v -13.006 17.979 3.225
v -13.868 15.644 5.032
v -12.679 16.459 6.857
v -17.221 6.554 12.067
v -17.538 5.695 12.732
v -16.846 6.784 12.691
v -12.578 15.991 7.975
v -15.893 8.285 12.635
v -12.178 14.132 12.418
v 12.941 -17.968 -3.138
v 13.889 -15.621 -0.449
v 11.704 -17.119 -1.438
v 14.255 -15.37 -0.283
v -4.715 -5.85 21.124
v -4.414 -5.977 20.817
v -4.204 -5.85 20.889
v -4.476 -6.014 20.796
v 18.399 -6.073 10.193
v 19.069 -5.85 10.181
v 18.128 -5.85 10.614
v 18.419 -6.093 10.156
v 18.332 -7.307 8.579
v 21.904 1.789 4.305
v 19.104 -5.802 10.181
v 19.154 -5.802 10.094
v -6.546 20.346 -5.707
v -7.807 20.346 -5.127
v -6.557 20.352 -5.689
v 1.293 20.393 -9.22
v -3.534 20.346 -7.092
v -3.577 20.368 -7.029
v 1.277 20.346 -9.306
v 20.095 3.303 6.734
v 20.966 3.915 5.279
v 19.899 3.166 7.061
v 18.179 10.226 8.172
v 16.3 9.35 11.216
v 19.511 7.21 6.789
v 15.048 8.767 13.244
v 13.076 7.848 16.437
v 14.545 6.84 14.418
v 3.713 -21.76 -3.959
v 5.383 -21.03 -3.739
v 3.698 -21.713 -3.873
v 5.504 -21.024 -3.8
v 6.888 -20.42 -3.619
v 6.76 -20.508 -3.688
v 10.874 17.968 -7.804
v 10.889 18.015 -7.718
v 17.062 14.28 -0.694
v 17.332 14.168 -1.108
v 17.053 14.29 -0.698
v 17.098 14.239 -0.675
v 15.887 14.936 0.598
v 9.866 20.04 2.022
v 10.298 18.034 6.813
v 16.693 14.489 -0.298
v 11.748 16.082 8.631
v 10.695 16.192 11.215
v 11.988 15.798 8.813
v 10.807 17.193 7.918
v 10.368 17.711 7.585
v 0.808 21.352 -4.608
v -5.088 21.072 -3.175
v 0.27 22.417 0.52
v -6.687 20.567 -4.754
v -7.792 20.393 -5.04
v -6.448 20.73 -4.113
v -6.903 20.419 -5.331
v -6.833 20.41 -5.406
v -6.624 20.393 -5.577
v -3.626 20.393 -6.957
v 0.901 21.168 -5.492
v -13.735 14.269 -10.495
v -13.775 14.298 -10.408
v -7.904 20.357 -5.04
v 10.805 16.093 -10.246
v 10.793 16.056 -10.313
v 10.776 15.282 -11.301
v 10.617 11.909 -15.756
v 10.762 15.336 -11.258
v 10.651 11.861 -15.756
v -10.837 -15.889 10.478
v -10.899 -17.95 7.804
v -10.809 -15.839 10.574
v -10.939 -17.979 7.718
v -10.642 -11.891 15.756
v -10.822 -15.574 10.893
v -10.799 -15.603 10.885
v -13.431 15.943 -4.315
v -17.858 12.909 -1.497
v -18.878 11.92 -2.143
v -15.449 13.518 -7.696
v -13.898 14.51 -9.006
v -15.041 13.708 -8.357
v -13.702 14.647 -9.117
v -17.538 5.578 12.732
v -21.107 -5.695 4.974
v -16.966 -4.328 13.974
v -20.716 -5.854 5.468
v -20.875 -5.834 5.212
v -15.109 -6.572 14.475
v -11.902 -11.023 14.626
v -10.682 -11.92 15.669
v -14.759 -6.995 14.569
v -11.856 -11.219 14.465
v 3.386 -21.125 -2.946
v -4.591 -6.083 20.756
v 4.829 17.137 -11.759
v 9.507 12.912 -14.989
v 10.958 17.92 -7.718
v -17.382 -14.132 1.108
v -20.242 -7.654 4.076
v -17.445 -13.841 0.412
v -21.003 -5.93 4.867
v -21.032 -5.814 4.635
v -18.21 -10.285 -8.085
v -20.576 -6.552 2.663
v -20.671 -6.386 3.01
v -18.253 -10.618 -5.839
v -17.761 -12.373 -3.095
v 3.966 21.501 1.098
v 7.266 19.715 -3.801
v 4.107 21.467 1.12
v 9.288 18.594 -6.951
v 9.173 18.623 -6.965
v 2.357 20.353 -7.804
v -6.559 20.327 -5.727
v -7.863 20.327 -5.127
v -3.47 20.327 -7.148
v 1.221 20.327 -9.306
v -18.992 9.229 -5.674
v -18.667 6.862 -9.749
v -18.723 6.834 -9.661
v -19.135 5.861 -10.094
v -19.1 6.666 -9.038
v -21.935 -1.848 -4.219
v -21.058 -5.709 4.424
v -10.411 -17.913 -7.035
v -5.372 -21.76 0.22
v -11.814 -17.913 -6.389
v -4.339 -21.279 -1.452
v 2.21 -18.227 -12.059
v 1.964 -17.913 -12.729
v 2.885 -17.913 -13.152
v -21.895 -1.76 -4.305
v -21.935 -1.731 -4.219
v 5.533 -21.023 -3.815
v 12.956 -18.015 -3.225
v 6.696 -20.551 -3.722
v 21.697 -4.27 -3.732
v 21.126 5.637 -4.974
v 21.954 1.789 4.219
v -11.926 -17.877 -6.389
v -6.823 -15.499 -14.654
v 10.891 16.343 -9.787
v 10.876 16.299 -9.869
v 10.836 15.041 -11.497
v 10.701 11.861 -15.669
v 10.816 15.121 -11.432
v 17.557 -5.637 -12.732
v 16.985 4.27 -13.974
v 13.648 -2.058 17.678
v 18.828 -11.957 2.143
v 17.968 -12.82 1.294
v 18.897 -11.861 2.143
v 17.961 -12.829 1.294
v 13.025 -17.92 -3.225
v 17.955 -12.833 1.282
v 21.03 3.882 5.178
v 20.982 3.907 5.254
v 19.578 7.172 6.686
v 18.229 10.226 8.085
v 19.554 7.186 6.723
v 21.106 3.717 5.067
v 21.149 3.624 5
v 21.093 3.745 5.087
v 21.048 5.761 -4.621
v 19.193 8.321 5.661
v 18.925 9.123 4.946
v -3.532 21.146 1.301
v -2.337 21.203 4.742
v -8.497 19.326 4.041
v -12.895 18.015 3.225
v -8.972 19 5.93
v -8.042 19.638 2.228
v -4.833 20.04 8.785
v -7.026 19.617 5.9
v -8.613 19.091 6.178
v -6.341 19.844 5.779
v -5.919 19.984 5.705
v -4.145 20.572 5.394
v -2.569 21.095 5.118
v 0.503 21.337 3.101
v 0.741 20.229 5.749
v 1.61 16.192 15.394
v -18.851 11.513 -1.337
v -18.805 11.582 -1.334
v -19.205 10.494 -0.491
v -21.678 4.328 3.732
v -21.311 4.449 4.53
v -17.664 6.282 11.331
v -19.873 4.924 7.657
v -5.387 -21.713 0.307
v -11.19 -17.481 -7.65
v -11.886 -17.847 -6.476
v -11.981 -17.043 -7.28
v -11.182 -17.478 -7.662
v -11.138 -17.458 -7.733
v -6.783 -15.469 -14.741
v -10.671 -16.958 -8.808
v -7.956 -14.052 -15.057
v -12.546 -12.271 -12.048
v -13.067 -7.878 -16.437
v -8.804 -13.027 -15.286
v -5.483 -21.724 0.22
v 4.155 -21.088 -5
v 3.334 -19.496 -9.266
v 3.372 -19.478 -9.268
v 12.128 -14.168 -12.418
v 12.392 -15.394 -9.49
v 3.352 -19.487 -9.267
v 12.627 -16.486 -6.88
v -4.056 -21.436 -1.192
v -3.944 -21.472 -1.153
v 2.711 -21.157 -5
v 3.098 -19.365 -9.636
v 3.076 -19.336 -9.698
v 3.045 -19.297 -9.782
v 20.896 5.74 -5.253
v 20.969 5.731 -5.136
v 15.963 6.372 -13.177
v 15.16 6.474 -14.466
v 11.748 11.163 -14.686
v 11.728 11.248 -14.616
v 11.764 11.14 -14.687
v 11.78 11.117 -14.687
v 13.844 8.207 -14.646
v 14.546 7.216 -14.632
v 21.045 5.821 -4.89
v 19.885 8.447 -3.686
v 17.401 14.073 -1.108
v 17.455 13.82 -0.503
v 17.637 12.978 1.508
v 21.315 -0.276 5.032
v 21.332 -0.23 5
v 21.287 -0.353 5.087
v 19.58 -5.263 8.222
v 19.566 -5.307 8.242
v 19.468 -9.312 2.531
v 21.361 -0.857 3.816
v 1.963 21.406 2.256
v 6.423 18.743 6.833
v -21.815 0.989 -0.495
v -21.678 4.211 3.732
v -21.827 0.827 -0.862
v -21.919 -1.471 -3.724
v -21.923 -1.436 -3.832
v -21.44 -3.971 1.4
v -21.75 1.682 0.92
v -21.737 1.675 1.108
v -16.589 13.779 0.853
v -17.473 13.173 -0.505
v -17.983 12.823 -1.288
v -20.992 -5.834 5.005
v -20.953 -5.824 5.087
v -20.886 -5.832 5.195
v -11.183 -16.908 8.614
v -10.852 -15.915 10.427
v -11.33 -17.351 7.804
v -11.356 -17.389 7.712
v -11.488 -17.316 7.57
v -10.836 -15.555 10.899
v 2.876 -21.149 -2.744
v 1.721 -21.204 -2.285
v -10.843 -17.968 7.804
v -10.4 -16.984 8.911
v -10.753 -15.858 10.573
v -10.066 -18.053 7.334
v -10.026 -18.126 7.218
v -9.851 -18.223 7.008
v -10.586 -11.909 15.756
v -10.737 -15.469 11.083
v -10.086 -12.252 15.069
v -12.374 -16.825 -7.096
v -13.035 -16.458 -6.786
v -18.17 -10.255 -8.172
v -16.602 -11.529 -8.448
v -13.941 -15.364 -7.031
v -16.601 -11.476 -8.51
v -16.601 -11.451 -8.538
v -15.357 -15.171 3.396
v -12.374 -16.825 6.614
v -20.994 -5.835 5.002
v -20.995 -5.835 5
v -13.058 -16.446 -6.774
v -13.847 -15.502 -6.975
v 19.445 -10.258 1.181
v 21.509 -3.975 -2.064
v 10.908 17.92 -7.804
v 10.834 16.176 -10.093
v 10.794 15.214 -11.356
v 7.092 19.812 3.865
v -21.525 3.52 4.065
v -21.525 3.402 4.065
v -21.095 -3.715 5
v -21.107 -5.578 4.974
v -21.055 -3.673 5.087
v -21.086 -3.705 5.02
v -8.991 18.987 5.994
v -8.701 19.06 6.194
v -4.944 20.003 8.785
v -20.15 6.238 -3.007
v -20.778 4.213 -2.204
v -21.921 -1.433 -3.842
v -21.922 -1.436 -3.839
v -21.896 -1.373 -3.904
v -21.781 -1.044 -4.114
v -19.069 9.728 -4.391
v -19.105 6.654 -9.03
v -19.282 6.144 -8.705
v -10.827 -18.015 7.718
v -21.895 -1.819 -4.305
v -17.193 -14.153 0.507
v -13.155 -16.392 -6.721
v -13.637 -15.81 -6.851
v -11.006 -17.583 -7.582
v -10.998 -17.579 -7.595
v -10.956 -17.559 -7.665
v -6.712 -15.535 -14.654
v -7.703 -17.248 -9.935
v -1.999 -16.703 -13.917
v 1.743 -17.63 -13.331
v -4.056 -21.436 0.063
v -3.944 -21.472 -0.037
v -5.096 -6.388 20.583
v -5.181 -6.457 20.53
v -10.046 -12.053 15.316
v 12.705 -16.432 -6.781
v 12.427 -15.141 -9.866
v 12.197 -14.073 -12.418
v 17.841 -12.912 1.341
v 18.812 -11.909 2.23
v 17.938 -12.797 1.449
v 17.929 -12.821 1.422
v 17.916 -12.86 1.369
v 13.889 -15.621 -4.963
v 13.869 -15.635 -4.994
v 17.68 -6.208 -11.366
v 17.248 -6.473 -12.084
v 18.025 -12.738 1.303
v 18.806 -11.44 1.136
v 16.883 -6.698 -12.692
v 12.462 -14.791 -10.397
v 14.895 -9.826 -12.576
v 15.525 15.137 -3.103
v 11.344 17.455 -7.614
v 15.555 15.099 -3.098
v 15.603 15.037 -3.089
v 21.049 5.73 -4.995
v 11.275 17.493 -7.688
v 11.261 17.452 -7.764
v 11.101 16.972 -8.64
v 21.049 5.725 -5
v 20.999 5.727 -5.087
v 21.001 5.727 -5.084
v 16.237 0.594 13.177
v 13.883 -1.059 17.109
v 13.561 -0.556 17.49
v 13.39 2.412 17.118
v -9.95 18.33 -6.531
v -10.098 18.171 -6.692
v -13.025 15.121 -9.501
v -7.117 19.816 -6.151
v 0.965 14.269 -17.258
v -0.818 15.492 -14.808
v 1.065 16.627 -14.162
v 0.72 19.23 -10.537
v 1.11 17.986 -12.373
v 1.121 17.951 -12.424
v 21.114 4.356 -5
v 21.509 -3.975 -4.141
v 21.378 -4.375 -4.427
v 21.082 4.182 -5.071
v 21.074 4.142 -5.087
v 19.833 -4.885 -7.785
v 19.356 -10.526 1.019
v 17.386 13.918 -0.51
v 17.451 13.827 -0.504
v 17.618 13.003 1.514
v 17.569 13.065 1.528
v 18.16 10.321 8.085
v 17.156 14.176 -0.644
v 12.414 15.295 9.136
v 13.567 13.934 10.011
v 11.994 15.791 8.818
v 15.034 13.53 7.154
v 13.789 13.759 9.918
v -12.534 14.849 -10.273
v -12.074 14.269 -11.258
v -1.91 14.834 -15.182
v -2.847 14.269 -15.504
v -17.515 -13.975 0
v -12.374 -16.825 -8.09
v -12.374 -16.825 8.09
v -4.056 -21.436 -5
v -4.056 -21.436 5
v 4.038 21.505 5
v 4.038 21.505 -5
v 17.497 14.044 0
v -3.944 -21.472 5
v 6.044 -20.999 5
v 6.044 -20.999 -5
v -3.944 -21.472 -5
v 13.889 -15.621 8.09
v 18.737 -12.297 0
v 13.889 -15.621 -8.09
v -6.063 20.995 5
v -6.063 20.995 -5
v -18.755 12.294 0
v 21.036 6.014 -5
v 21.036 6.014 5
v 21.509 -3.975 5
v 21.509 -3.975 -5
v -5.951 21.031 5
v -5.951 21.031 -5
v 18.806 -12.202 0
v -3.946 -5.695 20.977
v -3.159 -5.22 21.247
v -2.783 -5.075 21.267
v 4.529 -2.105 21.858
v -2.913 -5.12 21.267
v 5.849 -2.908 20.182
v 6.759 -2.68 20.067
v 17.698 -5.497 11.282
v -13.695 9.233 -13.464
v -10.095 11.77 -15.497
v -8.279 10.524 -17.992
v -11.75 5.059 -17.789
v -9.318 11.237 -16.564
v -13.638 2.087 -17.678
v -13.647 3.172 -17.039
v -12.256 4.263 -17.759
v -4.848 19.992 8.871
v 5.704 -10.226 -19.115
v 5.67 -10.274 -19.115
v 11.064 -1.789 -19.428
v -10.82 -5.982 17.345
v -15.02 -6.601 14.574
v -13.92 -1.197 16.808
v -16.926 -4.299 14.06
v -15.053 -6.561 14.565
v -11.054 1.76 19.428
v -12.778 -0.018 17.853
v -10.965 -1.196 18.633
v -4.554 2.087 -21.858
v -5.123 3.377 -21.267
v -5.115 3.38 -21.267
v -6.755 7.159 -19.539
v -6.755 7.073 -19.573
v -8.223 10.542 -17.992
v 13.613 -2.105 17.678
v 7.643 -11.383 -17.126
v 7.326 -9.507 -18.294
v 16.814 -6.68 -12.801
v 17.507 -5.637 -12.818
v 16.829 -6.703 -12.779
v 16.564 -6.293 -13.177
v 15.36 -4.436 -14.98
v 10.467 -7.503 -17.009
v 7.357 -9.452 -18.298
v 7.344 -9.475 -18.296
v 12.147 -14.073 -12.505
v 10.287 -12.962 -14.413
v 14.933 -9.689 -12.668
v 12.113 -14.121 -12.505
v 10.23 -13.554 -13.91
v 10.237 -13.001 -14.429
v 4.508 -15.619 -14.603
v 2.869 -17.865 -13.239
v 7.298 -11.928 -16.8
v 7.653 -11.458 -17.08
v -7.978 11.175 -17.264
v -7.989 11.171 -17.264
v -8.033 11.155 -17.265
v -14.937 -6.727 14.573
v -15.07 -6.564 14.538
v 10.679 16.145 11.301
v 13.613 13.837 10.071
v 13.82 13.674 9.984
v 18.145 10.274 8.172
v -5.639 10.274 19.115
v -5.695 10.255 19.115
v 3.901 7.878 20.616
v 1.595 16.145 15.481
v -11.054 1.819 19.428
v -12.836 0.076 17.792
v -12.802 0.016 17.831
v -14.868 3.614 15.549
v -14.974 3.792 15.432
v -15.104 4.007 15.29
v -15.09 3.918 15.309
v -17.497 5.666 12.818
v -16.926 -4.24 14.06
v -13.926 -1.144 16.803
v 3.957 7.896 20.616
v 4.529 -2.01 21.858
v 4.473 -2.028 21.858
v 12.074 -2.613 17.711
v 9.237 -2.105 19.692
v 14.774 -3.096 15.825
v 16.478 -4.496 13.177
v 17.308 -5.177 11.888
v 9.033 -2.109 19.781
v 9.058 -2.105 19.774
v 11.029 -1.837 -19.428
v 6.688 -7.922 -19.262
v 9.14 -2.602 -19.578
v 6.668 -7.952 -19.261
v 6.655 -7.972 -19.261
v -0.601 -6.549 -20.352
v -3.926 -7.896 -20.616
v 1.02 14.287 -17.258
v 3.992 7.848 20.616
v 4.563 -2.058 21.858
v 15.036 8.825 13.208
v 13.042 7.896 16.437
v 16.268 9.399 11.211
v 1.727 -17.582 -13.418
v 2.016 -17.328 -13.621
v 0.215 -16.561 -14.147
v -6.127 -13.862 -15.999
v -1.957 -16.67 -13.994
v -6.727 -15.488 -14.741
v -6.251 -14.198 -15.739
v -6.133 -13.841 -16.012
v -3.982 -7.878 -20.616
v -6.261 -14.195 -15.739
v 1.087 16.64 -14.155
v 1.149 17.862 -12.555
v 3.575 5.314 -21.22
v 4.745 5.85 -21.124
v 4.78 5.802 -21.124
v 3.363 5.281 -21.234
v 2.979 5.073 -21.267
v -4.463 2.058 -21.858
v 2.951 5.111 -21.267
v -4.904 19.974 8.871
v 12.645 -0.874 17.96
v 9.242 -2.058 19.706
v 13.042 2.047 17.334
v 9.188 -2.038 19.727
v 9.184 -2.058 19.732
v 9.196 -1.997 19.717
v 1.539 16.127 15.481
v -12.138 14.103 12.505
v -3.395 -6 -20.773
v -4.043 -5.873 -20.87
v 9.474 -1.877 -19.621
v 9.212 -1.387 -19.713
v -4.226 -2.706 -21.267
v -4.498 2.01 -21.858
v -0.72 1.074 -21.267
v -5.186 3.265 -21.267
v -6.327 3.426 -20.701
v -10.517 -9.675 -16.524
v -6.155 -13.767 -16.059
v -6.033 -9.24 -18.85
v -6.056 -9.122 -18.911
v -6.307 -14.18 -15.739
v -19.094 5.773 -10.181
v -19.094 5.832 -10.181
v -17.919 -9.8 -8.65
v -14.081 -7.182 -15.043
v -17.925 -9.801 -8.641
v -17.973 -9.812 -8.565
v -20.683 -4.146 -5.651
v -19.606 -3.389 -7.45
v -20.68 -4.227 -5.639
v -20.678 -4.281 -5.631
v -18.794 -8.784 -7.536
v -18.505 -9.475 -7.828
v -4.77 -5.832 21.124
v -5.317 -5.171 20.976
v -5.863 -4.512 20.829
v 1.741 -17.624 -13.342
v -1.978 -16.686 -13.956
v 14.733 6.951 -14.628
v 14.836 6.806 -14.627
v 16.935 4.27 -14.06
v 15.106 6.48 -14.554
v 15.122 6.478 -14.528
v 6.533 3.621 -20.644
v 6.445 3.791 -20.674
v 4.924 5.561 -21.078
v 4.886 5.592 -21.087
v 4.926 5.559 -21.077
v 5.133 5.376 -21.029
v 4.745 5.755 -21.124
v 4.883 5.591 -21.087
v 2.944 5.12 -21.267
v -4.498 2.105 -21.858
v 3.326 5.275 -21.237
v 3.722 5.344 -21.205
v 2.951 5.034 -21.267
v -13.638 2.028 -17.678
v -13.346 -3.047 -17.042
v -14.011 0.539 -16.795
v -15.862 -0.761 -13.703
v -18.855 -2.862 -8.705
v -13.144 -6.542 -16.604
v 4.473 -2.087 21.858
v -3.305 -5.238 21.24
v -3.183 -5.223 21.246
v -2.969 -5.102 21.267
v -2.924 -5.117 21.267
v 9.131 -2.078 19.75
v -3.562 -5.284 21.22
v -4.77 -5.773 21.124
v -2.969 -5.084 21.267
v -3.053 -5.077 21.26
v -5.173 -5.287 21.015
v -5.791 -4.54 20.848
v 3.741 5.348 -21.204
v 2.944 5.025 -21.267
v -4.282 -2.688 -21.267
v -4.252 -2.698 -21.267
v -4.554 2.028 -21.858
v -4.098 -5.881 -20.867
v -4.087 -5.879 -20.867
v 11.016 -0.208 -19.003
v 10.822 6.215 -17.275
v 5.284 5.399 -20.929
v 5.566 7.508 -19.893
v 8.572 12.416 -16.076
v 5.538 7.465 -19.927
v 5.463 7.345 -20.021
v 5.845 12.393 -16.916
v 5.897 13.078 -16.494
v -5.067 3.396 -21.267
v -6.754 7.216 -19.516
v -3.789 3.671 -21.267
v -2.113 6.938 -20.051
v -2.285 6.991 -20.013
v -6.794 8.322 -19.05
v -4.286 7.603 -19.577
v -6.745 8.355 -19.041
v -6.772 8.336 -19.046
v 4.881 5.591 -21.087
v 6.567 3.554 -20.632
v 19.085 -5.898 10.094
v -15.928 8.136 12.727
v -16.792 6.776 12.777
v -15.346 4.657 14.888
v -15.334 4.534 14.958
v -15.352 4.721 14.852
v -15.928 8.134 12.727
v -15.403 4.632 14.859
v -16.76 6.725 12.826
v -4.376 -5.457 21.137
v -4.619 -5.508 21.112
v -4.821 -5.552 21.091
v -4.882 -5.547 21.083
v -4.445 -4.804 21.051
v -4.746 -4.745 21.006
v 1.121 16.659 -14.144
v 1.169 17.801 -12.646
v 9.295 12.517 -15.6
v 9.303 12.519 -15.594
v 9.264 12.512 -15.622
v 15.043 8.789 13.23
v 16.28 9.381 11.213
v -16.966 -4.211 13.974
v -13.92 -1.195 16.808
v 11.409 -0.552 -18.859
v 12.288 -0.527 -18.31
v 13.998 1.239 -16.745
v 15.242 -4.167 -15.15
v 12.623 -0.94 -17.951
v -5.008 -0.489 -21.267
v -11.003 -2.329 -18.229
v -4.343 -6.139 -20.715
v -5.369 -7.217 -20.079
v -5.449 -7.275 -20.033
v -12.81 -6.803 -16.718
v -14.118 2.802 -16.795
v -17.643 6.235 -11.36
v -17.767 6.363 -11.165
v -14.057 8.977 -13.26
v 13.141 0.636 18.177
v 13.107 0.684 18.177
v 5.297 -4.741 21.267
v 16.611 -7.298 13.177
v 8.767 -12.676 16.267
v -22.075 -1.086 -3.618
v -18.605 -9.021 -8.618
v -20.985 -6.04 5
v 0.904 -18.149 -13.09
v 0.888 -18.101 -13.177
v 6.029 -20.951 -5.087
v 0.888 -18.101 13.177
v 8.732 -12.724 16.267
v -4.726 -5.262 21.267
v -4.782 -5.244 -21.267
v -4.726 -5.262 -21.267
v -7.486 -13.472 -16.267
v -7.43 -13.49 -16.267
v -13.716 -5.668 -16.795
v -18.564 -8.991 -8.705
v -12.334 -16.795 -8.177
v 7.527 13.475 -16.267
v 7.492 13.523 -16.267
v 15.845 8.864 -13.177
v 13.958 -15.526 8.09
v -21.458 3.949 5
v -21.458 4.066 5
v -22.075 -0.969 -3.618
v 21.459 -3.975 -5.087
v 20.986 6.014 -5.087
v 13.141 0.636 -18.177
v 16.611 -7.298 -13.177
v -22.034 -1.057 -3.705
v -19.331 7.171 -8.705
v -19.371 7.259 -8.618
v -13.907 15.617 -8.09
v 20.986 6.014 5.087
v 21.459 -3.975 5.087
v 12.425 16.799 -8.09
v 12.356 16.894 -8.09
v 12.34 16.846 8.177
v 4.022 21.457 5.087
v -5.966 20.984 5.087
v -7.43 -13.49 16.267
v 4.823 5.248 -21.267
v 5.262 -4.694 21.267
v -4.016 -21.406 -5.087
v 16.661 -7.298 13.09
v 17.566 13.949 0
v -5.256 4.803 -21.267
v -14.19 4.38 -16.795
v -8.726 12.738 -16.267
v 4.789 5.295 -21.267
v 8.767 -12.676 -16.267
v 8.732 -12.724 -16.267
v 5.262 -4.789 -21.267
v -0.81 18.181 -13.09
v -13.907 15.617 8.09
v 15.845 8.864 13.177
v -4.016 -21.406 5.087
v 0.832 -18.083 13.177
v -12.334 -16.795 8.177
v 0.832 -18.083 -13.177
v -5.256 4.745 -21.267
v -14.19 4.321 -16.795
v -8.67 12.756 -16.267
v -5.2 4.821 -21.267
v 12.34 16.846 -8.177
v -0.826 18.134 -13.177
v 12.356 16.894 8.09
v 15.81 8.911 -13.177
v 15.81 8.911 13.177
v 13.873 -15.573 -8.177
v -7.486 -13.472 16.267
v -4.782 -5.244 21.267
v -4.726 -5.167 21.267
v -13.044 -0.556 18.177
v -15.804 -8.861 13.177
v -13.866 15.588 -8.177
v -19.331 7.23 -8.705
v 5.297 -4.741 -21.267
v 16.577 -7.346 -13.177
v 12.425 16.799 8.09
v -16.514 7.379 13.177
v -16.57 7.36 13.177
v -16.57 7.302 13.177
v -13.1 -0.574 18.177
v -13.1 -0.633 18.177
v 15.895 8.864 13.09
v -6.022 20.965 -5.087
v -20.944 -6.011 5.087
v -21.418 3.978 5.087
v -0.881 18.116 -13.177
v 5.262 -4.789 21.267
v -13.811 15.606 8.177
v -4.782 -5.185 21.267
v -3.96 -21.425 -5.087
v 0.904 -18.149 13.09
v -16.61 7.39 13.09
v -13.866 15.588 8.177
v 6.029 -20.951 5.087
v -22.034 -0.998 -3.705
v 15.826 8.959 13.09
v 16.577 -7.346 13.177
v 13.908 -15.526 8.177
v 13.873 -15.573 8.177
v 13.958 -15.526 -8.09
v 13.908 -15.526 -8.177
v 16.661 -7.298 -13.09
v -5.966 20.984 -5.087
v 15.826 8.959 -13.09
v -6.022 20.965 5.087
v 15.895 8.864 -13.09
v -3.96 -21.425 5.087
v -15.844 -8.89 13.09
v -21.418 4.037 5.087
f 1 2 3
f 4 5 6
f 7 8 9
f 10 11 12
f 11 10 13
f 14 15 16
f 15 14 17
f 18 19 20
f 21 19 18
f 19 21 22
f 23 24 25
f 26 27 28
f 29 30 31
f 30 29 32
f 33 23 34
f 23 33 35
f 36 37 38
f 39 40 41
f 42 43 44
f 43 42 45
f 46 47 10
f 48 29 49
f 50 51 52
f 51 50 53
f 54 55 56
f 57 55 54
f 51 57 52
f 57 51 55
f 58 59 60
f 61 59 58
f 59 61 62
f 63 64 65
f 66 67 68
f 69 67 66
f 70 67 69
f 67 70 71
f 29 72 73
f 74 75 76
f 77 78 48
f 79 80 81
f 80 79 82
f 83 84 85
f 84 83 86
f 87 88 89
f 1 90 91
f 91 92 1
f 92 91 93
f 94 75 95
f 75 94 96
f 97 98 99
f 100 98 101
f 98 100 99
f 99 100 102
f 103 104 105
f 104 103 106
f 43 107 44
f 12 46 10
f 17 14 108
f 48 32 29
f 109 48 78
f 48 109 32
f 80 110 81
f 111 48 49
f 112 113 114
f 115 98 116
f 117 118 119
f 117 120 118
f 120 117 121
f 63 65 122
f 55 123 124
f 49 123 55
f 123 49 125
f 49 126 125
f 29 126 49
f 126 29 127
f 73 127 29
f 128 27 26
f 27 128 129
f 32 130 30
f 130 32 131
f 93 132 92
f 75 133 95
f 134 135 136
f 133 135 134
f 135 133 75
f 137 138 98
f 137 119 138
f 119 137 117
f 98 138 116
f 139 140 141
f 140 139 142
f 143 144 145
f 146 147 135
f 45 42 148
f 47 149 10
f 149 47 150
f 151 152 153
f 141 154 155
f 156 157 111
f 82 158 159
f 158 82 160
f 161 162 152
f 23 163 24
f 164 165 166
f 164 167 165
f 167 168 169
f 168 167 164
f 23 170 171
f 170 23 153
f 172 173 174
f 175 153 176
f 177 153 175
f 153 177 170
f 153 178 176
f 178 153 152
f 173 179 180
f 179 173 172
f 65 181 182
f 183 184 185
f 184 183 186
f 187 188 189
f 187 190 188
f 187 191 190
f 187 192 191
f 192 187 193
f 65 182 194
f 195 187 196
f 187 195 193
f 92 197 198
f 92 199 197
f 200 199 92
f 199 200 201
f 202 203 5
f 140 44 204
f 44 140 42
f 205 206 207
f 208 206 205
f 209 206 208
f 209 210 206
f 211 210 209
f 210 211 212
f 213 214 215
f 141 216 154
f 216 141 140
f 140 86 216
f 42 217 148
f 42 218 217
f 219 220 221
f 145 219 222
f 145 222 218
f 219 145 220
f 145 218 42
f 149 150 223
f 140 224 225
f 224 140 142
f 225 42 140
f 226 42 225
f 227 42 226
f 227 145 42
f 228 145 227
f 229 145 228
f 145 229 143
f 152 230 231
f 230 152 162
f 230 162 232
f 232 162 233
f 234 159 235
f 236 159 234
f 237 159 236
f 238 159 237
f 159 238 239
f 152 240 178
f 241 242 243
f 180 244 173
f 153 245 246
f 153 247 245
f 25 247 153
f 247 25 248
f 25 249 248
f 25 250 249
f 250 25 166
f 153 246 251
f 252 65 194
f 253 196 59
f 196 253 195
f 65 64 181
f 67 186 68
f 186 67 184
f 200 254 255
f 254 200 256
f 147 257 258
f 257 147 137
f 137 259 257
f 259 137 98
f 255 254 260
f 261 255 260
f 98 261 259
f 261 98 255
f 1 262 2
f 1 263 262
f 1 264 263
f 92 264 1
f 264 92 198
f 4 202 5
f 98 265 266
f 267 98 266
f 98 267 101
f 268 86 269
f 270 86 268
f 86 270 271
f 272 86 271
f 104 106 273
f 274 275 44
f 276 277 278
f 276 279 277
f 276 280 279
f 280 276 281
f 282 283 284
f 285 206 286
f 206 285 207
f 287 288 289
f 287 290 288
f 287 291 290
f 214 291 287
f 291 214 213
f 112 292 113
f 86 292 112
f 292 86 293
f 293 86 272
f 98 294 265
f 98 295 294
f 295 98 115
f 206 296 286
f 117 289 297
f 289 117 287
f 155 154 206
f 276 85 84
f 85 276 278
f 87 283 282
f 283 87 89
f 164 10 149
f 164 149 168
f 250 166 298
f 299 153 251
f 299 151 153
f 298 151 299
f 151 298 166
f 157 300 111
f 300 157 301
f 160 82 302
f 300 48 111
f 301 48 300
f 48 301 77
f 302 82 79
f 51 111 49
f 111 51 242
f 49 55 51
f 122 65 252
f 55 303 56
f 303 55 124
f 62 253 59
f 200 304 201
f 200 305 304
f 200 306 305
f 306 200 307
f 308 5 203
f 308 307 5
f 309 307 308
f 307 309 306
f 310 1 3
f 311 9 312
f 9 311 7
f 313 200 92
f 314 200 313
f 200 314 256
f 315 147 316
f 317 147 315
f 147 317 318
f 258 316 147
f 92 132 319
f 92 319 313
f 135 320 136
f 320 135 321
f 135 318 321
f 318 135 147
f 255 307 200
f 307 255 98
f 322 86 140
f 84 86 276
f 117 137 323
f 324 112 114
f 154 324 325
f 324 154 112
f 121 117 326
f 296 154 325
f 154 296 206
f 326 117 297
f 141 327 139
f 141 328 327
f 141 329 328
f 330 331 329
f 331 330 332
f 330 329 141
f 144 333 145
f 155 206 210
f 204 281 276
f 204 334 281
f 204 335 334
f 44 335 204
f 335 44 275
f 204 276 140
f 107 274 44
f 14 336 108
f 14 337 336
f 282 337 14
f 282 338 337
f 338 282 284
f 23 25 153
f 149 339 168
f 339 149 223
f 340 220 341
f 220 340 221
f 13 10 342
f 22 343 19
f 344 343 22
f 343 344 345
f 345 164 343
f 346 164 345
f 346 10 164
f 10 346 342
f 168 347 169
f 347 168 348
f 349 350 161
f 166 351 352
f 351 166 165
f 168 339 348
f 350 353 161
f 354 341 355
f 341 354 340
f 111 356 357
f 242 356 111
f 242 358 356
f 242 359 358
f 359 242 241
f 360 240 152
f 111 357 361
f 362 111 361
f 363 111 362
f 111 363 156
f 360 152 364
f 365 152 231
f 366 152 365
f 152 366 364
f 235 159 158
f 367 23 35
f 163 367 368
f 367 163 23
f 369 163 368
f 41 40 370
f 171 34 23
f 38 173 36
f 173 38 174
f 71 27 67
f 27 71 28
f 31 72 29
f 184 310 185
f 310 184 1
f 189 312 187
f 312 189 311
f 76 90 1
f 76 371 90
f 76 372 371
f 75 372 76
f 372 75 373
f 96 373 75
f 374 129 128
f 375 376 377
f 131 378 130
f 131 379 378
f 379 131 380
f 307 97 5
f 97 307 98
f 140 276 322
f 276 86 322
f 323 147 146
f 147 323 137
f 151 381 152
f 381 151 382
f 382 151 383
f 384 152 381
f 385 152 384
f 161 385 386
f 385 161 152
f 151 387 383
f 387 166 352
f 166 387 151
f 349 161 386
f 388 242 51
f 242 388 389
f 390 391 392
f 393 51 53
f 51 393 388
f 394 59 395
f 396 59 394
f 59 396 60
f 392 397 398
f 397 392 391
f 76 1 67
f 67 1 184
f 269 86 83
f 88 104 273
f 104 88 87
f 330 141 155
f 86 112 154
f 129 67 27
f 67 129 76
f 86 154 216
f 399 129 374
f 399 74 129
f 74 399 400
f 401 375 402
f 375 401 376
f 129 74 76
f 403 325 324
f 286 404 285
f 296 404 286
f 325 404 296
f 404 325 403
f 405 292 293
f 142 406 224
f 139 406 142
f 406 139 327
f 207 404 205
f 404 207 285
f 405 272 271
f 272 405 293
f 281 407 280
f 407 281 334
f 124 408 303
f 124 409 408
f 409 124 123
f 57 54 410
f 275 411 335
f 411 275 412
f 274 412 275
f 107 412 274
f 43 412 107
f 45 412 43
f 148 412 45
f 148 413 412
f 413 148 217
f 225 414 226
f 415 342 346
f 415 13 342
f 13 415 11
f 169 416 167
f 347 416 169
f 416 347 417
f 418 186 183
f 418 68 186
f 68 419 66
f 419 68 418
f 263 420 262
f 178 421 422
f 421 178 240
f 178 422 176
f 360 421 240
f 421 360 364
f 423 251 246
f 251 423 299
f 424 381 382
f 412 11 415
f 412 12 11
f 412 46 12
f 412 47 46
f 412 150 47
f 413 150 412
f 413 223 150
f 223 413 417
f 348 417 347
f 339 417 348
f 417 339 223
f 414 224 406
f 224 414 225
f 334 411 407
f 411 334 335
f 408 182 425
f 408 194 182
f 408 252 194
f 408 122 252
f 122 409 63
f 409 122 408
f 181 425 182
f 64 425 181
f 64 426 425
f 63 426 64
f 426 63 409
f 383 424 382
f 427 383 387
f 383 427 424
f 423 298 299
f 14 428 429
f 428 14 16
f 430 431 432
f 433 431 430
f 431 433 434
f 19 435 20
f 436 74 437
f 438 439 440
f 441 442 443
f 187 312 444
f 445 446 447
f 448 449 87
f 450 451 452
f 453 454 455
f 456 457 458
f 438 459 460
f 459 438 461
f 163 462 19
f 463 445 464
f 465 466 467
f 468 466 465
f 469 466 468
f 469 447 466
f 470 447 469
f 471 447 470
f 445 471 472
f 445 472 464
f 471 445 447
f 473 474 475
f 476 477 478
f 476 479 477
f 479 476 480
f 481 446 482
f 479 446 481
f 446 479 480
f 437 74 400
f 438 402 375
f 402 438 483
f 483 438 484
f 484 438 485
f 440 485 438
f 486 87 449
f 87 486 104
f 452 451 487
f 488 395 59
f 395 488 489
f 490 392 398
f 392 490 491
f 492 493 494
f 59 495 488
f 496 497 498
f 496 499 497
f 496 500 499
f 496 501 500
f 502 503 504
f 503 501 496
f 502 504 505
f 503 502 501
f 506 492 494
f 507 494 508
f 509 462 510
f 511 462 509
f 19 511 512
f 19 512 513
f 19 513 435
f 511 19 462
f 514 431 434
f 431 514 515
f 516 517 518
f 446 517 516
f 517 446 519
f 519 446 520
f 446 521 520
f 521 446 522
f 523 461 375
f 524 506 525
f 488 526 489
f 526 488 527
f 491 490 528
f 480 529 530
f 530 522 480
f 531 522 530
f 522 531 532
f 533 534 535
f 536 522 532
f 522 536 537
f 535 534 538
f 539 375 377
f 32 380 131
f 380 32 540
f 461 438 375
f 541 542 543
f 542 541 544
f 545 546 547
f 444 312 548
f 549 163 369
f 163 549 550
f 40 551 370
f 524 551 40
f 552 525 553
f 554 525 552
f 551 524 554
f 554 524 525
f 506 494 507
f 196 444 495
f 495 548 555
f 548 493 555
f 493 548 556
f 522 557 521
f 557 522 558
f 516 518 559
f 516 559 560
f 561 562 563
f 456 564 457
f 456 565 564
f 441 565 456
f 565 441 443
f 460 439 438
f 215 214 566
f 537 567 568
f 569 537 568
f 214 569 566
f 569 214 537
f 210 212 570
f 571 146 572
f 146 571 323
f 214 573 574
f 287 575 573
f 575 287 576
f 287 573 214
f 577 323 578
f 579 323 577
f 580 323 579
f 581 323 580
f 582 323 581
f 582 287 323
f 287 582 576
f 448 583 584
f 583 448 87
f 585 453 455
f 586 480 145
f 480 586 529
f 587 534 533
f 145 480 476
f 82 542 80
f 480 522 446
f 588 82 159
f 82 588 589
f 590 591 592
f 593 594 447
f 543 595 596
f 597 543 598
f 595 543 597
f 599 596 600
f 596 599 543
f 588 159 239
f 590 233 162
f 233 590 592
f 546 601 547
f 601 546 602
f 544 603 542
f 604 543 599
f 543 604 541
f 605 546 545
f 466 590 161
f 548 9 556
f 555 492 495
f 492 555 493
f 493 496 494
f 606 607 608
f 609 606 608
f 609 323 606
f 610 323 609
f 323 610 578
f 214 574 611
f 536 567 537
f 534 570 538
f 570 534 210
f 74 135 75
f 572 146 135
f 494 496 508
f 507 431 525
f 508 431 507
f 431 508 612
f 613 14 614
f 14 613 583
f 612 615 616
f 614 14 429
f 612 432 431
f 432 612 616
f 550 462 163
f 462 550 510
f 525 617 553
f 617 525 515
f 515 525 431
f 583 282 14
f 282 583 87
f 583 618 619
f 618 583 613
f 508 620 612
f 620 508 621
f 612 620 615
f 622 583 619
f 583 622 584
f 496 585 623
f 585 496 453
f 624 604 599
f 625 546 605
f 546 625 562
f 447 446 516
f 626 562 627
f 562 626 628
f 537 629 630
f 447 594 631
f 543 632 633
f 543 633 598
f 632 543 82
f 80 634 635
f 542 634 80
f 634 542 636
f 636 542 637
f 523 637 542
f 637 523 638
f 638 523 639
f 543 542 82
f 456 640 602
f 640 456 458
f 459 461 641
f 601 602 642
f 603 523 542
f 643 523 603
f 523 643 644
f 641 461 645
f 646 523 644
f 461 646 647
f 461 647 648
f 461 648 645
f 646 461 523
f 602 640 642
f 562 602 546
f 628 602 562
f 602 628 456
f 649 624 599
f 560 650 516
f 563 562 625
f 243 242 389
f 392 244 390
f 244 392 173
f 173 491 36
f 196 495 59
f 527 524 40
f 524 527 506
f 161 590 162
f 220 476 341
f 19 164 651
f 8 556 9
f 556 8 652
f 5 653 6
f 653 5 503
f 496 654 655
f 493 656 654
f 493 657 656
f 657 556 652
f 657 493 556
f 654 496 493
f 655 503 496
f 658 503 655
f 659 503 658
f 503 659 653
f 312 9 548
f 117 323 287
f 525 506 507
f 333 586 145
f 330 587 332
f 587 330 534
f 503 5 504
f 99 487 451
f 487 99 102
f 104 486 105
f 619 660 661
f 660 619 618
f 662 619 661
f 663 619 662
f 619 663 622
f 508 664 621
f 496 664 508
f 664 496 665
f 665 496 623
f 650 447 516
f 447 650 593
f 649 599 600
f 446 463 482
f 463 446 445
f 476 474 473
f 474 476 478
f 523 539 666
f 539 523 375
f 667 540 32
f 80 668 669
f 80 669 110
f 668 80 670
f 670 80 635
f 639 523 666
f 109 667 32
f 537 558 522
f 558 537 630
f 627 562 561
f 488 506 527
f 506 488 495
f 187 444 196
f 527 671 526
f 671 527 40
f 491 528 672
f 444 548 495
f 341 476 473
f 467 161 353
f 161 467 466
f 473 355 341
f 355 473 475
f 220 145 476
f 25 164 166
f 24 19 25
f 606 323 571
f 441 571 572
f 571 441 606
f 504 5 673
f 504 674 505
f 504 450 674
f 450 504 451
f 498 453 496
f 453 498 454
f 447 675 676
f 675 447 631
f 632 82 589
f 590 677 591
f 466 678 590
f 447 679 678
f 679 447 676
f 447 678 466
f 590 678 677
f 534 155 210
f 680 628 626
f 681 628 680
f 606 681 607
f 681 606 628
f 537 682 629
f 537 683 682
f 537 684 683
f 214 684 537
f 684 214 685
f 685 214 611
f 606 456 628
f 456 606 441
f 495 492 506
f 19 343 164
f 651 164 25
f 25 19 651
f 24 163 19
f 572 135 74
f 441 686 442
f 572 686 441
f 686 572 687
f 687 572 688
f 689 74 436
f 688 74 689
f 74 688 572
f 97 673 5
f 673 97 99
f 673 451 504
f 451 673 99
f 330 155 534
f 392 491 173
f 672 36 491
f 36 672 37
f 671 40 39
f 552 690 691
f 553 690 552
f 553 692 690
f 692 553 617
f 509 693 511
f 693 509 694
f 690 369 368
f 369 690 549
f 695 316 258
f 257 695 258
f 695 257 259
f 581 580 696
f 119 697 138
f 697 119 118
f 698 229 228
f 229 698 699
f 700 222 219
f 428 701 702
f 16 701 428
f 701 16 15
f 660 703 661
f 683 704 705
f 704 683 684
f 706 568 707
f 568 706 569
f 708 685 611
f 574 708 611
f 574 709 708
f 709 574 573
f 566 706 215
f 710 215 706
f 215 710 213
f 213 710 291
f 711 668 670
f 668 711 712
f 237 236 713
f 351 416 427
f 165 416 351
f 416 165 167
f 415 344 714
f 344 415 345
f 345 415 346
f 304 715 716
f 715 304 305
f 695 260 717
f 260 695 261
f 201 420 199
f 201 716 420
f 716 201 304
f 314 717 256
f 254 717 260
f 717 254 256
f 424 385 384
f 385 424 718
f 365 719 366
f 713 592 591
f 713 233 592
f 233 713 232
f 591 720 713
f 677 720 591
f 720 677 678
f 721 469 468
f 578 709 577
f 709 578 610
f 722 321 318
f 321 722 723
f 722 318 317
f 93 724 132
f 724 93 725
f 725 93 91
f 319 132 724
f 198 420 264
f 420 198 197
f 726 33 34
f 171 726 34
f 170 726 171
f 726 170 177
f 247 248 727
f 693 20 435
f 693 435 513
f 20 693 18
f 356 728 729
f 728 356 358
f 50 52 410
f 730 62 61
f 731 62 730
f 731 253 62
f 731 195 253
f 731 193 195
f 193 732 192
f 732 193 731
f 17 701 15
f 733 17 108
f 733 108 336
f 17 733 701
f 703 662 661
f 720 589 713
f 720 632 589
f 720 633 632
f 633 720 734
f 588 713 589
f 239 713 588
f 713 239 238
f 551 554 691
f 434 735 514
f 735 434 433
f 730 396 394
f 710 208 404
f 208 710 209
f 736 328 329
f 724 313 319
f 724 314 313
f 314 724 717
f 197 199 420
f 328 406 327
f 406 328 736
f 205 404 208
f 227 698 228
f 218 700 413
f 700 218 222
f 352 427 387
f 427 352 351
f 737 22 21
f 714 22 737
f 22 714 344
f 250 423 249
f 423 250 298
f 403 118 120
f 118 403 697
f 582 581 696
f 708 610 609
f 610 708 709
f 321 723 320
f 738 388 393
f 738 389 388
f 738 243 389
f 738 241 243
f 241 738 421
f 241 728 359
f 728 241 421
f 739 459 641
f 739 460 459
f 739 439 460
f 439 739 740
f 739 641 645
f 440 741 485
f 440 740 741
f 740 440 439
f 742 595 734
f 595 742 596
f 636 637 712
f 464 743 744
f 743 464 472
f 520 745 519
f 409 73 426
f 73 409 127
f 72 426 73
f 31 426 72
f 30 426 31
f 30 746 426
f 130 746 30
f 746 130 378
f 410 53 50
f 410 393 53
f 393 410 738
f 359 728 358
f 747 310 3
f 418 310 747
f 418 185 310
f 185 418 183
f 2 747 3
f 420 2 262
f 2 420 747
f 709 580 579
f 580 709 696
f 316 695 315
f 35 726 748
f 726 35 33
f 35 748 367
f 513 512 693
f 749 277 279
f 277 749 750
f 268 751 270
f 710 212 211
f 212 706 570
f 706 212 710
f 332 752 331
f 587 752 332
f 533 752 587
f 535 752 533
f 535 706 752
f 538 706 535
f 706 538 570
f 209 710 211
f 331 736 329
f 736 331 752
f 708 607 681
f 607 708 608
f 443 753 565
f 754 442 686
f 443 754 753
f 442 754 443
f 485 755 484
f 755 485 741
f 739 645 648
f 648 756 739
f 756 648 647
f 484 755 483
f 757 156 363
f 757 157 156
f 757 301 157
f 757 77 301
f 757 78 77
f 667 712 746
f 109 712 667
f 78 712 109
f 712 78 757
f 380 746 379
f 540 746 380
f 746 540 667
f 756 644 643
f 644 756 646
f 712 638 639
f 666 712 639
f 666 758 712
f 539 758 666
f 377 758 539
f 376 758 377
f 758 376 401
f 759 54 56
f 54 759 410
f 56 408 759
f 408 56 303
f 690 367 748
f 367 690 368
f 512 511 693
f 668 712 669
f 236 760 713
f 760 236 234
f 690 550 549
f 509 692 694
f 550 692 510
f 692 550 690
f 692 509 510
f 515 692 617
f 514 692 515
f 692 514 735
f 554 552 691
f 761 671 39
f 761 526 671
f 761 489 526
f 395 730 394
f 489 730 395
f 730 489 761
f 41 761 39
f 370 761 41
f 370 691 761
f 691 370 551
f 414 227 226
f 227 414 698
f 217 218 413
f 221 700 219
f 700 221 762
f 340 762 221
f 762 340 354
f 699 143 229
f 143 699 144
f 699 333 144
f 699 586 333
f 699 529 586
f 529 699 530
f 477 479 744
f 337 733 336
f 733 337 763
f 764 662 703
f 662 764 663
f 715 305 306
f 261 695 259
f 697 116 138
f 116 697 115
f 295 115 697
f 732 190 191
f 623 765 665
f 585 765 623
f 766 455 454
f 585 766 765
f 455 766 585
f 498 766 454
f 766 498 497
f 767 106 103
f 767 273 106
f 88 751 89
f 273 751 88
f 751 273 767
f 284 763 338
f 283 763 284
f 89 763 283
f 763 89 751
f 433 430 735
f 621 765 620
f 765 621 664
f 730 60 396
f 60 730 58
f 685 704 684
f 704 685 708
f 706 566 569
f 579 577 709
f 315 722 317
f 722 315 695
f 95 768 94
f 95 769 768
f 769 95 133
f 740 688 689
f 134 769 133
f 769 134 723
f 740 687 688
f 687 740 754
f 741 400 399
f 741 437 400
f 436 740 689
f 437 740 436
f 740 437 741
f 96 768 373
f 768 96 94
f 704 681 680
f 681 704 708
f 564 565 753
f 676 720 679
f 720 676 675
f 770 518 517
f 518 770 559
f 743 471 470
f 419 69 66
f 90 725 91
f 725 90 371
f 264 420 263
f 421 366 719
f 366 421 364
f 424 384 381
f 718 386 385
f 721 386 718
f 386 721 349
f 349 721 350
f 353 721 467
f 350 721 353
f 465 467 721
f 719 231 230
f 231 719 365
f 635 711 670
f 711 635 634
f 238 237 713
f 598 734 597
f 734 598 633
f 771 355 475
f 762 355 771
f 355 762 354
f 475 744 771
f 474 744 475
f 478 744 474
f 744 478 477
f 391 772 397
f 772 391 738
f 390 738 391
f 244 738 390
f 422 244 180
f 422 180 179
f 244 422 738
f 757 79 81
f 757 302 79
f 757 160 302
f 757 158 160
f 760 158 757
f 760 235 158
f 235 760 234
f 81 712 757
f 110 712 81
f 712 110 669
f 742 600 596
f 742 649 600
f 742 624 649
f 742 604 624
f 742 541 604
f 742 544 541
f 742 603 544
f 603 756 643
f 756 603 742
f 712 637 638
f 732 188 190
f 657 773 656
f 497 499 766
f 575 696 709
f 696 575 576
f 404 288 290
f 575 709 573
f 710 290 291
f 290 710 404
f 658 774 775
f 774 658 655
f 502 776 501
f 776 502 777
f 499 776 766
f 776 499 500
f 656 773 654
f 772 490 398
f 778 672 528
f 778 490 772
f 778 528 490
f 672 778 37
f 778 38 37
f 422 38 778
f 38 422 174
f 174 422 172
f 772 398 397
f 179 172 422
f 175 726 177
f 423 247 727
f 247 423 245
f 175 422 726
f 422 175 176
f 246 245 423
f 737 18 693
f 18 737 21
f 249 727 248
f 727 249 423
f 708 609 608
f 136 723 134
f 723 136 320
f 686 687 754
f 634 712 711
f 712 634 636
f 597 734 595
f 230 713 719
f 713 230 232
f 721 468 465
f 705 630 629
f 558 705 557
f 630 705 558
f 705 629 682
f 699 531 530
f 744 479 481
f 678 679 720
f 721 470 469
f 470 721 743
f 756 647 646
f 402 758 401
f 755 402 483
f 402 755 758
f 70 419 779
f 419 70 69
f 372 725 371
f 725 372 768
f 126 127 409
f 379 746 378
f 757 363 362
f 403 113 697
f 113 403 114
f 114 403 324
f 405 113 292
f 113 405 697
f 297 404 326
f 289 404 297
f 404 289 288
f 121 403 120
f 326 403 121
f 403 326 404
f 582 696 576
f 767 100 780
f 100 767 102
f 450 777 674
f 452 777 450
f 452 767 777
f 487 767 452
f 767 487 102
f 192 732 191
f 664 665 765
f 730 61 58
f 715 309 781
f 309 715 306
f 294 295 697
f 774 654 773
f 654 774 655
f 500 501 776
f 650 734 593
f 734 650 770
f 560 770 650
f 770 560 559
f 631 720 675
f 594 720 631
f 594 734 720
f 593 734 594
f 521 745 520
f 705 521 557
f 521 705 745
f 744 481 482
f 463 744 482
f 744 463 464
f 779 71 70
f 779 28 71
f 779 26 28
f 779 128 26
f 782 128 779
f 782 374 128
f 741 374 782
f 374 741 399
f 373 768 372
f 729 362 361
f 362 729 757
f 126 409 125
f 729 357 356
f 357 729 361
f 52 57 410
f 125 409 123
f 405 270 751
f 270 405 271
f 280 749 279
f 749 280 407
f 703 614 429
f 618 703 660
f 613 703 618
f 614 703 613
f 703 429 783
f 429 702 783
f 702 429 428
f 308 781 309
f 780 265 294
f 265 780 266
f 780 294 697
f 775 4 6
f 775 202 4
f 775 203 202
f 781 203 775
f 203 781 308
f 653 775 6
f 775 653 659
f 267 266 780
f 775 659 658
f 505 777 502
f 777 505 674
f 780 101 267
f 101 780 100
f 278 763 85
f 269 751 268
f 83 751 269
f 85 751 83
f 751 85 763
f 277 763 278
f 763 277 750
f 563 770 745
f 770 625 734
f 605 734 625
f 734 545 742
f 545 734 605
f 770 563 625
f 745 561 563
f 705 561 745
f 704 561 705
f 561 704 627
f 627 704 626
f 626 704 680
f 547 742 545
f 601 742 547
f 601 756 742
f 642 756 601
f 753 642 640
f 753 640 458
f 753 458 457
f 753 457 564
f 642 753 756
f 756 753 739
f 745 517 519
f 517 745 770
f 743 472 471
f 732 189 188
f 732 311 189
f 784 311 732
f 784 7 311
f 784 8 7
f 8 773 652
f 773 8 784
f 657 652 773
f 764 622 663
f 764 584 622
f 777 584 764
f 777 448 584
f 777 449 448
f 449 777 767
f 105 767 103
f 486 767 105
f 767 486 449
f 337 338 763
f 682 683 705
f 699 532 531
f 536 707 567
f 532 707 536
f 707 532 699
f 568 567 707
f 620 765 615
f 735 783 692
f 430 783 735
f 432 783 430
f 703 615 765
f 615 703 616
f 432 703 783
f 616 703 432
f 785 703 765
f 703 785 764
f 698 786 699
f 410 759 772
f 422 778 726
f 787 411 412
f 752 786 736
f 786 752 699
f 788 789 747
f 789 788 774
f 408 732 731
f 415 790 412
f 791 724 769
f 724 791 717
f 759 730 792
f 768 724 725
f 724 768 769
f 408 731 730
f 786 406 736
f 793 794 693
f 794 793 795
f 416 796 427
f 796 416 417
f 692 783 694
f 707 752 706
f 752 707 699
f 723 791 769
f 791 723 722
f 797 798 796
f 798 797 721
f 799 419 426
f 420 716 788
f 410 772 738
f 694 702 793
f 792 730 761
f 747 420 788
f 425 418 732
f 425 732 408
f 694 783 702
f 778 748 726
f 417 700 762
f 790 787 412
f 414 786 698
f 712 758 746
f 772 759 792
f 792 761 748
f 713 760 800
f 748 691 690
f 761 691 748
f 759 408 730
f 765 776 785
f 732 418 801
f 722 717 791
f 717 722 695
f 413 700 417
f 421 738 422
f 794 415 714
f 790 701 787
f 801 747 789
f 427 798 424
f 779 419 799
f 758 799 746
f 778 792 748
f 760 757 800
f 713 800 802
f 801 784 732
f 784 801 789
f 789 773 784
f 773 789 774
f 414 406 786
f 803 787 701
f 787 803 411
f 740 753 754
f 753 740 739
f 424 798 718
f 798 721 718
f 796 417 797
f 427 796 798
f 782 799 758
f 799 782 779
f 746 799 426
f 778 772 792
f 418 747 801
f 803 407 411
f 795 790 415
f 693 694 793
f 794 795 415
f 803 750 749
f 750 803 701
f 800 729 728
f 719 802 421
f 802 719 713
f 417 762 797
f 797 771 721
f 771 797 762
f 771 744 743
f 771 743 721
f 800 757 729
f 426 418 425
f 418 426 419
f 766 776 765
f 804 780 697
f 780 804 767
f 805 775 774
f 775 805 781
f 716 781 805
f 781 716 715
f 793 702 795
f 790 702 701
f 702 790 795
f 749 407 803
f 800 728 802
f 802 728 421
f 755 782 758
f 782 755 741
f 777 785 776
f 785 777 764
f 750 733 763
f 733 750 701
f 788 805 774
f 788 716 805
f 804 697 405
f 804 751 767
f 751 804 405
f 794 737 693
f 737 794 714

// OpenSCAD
// Auto-generated OpenSCAD file

    inner_points = 10*[[-1.652954838618672, 0.7331031267239583, 1.309016994374885], [1.8705714695316353, -1.2202296084263586, 9.520162436160717e-14], [-2.1377569026756937, 0.40075020963339975, 0.49999999999995376], [1.3857694054746135, -1.5525825255169172, -0.8090169943748362], [-1.3826041813849252, 1.5558488481550894, 0.8090169943748362], [2.140922126765382, -0.3974838869952276, -0.49999999999995376], [-1.867406245441947, 1.2234959310645308, -9.520162436160717e-14], [1.6561200627083603, -0.7298368040857861, -1.309016994374885], [-0.7445241014447653, -1.3442341281397892, 1.618033988749972], [0.08726762778757838, -1.8053534363108568, 1.3090169943750618], [-1.2293261655017869, -1.6765870452303477, 0.8090169943750405], [-0.3975344362694432, -2.1377063534014153, 0.5000000000001303], [0.4006996603591313, 2.1409726760395875, -0.5000000000001303], [1.232491389591475, 1.67985336786852, -0.8090169943750405], [-0.08410240369789032, 1.808619758949029, -1.3090169943750618], [0.7476893255344533, 1.3475004507779613, -1.618033988749972], [1.3091303975330184, 0.0636354211759657, 1.8090169943749566], [-2.199388481084053, -0.10273410018217301, -0.36180339887500484], [-0.7445241014447332, -1.3442341281399923, -1.6180339887498179], [1.579481054766765, 0.8863811426070967, 1.3090169943749077], [-1.929037823850306, 0.7200116212489581, -0.8618033988750537], [-0.47417344421098645, -0.5214884067088612, -2.118033988749867], [2.140922126765372, -0.3974838869951649, 0.5000000000000463], [-1.3675967518516992, -0.5638534083533033, -1.670820393249915], [0.8716938452479853, -1.2675951201984228, -1.6180339887498065], [-1.5763158306771028, -0.8831148199687601, 1.3090169943749874], [0.6013431880142225, -2.0903408416294527, 0.5000000000001372], [-0.5981779639245345, 2.093607164267625, -0.5000000000001372], [1.579481054766791, 0.8863811426069322, -1.3090169943749874], [0.5247041800726373, -0.4741228949366325, 2.11803398874993], [-1.2293261655017709, -1.6765870452304492, -0.8090169943748543], [1.232491389591459, 1.6798533678686214, 0.8090169943748543], [-0.5215389559829493, 0.4773892175748047, -2.11803398874993], [-1.305965173443366, -0.060369098537566515, 1.8090169943749381], [1.3857694054745975, -1.5525825255168155, 0.8090169943750587], [-2.090391390903731, -0.5981274146502662, 0.5000000000000169], [0.6013431880142324, -2.0903408416295153, -0.49999999999986267], [-0.5981779639245444, 2.0936071642676874, 0.49999999999986267], [2.0935566149934193, 0.6013937372884384, -0.5000000000000169], [-1.3826041813849093, 1.5558488481549877, -0.8090169943750587], [1.3091303975330542, 0.06363542117573866, -1.8090169943749381], [-0.4741734442110284, -0.5214884067085954, 2.1180339887499233], [0.8716938452479531, -1.26759512019822, 1.6180339887499833], [-1.743401725728415, -1.3915996399118535, 7.027711745877241e-14], [-0.39753443626943324, -2.137706353401478, -0.49999999999986966], [0.40069966035912136, 2.14097267603965, 0.49999999999986966], [1.7465669498181031, 1.3948659625500257, -7.027711745877241e-14], [-0.8685286211582651, 1.2708614428363922, -1.6180339887499833], [0.47733866830071653, 0.5247547293467676, -2.1180339887499233], [1.6561200627083341, -0.7298368040856218, 1.3090169943750098], [-1.8523988159087368, -0.8962063254437607, -0.8618033988749515], [0.08726762778760436, -1.8053534363110213, -1.3090169943748333], [2.093556614993409, 0.601393737288501, 0.4999999999999831], [-1.4149622636236618, 0.43502421593036245, -1.6708203932499783], [0.5247041800726793, -0.47412289493689824, -2.11803398874986]];

    outer_points = 10*[[0.4513288900262728, -0.2057852874430356, 2.1771593019343873], [-1.302649108448602, -0.7848281063879728, -1.6349978963843712], [0.3941935542206573, 0.7848281063879728, 2.052979362471562], [-1.3597844442542175, 0.2057852874430356, -1.7591778358471963], [1.3597844442542175, -0.2057852874430356, 1.7591778358471963], [-0.3941935542206573, -0.7848281063879728, -2.052979362471562], [1.302649108448602, 0.7848281063879728, 1.6349978963843712], [-0.4513288900262728, 0.2057852874430356, -2.1771593019343873], [-1.688543053881056, -0.4269599633384501, 1.3973530414307818], [-2.102601092560149, -0.5636534304925583, 0.4974248017124077], [-1.7456783896866714, 0.5636534304925583, 1.273173101967957], [-2.1597364283657643, 0.4269599633384501, 0.373244862249583], [2.1597364283657643, -0.4269599633384501, -0.373244862249583], [1.7456783896866714, -0.5636534304925583, -1.273173101967957], [2.102601092560149, 0.5636534304925583, -0.4974248017124077], [1.688543053881056, 0.4269599633384501, -1.3973530414307818], [-0.5402422132585865, -2.1664995714220154, 0.022043945687575728], [0.15791777208586583, 1.609728484671791, 1.5394493042628863], [-0.7822713796484513, 2.029806104267907, -0.5039907193187587], [0.3682133409693583, -2.1664995714220154, -0.3959375203996154], [1.0663733263138107, 1.609728484671791, 1.121467838175695], [0.1261841745794935, 2.029806104267907, -0.9219721854059499], [-0.6742469030791683, -1.544010572482048, -1.4654318282511805], [0.02391308226528406, 2.232217483611758, 0.051973530324130296], [-0.8238291541769085, 1.0494489622784173, -1.79053913048576], [-1.1014025269441718, 0.17893407152476137, 1.9341569349947676], [-2.185420545521156, -0.17893407152476137, -0.4218857840237987], [2.185420545521156, 0.17893407152476137, 0.4218857840237987], [1.1014025269441718, -0.17893407152476137, -1.9341569349947676], [-1.0858249656670136, -1.792036464295737, 0.7717884632905911], [-1.292542552570369, 1.792036464295737, 0.32250122159318684], [1.292542552570369, -1.792036464295737, -0.32250122159318684], [1.0858249656670136, 1.792036464295737, -0.7717884632905911], [-0.47300032157473804, -0.5802483945693141, 2.103723003127959], [-1.81292028137052, -1.0225977463601432, -0.8085059554724263], [-0.5654472368668626, 1.0225977463601432, 1.9027956403562043], [-1.9053671966626446, 0.5802483945693141, -1.0094333182441808], [1.9053671966626446, -0.5802483945693141, 1.0094333182441808], [0.5654472368668626, -1.0225977463601432, -1.9027956403562043], [1.81292028137052, 1.0225977463601432, 0.8085059554724263], [0.47300032157473804, 0.5802483945693141, -2.103723003127959], [-1.0601408485116224, -1.1861424294325253, 1.566919109563973], [-1.7301008284095134, -1.40731710532794, 0.11080463026378029], [-1.2097230996093626, 1.40731710532794, 1.2418118073293933], [-1.8796830795072537, 1.1861424294325253, -0.21430267197079933], [1.8796830795072537, -1.1861424294325253, 0.21430267197079933], [1.2097230996093626, -1.40731710532794, -1.2418118073293933], [1.7301008284095134, 1.40731710532794, -0.11080463026378029], [1.0601408485116224, 1.1861424294325253, -1.566919109563973], [-1.1845180760010863, -1.7817802124542186, -0.638939887339235], [-0.4863580906566339, 1.994447843639588, 0.8784654712360758], [-1.3694119065853356, 1.4239120694046958, -1.0407946128827448], [0.28539388800835175, -1.7817802124542186, -1.3152481061358219], [0.9835538733528042, 1.994447843639588, 0.202157252439489], [0.1005000574241024, 1.4239120694046958, -1.7171028316793315]];

    // Convex hull for inner set (I)
    module inner_hull() {
        hull() {
            for (p = inner_points) {
                translate(p) sphere(r=0.1);
            }
        }
    }

    // Convex hull for outer set (O) minus inner hull (O \ I)
    module outer_minus_inner() {
        difference() {
            hull() {
                for (p = outer_points) {
                    translate(p) sphere(r=0.1);
                }
            }
            inner_hull(); // Subtract inner hull
        }
    }

    // Convex hull for outer set (O) minus all translated inner hulls
    module outer_minus_AllTranslationInner() {
        difference() {
            hull() {
                for (p = outer_points) {
                    translate(p) sphere(r=0.1);
                }
            }
            hull() {
                translate([0,0,50]) inner_hull();
                translate([0,0,-50]) inner_hull();
            }; // Subtract translated inner hulls
        }
    }

    // Difference between outer_minus_inner and outer_minus_AllTranslationInner
    module outer_minus_inner_diff() {
        difference() {
            // Outer minus inner
            difference() {
                hull() {
                    for (p = outer_points) {
                        translate(p) sphere(r=0.1);
                    }
                }
                inner_hull();
            }

            // Subtract Outer minus AllTranslationInner
            difference() {
                hull() {
                    for (p = outer_points) {
                        translate(p) sphere(r=0.1);
                    }
                }
                hull() {
                    translate([0,0,50]) inner_hull();
                    translate([0,0,-50]) inner_hull();
                };
            }
        }
    }

    // Rendering all with colors applied
    color([1, 0, 0, 0.5]) inner_hull(); // Transparent red
    color([0, 1, 0, 1]) outer_minus_AllTranslationInner(); // Opaque green
    color([1, 1, 0, 1]) outer_minus_inner_diff(); // Opaque yellow
    
